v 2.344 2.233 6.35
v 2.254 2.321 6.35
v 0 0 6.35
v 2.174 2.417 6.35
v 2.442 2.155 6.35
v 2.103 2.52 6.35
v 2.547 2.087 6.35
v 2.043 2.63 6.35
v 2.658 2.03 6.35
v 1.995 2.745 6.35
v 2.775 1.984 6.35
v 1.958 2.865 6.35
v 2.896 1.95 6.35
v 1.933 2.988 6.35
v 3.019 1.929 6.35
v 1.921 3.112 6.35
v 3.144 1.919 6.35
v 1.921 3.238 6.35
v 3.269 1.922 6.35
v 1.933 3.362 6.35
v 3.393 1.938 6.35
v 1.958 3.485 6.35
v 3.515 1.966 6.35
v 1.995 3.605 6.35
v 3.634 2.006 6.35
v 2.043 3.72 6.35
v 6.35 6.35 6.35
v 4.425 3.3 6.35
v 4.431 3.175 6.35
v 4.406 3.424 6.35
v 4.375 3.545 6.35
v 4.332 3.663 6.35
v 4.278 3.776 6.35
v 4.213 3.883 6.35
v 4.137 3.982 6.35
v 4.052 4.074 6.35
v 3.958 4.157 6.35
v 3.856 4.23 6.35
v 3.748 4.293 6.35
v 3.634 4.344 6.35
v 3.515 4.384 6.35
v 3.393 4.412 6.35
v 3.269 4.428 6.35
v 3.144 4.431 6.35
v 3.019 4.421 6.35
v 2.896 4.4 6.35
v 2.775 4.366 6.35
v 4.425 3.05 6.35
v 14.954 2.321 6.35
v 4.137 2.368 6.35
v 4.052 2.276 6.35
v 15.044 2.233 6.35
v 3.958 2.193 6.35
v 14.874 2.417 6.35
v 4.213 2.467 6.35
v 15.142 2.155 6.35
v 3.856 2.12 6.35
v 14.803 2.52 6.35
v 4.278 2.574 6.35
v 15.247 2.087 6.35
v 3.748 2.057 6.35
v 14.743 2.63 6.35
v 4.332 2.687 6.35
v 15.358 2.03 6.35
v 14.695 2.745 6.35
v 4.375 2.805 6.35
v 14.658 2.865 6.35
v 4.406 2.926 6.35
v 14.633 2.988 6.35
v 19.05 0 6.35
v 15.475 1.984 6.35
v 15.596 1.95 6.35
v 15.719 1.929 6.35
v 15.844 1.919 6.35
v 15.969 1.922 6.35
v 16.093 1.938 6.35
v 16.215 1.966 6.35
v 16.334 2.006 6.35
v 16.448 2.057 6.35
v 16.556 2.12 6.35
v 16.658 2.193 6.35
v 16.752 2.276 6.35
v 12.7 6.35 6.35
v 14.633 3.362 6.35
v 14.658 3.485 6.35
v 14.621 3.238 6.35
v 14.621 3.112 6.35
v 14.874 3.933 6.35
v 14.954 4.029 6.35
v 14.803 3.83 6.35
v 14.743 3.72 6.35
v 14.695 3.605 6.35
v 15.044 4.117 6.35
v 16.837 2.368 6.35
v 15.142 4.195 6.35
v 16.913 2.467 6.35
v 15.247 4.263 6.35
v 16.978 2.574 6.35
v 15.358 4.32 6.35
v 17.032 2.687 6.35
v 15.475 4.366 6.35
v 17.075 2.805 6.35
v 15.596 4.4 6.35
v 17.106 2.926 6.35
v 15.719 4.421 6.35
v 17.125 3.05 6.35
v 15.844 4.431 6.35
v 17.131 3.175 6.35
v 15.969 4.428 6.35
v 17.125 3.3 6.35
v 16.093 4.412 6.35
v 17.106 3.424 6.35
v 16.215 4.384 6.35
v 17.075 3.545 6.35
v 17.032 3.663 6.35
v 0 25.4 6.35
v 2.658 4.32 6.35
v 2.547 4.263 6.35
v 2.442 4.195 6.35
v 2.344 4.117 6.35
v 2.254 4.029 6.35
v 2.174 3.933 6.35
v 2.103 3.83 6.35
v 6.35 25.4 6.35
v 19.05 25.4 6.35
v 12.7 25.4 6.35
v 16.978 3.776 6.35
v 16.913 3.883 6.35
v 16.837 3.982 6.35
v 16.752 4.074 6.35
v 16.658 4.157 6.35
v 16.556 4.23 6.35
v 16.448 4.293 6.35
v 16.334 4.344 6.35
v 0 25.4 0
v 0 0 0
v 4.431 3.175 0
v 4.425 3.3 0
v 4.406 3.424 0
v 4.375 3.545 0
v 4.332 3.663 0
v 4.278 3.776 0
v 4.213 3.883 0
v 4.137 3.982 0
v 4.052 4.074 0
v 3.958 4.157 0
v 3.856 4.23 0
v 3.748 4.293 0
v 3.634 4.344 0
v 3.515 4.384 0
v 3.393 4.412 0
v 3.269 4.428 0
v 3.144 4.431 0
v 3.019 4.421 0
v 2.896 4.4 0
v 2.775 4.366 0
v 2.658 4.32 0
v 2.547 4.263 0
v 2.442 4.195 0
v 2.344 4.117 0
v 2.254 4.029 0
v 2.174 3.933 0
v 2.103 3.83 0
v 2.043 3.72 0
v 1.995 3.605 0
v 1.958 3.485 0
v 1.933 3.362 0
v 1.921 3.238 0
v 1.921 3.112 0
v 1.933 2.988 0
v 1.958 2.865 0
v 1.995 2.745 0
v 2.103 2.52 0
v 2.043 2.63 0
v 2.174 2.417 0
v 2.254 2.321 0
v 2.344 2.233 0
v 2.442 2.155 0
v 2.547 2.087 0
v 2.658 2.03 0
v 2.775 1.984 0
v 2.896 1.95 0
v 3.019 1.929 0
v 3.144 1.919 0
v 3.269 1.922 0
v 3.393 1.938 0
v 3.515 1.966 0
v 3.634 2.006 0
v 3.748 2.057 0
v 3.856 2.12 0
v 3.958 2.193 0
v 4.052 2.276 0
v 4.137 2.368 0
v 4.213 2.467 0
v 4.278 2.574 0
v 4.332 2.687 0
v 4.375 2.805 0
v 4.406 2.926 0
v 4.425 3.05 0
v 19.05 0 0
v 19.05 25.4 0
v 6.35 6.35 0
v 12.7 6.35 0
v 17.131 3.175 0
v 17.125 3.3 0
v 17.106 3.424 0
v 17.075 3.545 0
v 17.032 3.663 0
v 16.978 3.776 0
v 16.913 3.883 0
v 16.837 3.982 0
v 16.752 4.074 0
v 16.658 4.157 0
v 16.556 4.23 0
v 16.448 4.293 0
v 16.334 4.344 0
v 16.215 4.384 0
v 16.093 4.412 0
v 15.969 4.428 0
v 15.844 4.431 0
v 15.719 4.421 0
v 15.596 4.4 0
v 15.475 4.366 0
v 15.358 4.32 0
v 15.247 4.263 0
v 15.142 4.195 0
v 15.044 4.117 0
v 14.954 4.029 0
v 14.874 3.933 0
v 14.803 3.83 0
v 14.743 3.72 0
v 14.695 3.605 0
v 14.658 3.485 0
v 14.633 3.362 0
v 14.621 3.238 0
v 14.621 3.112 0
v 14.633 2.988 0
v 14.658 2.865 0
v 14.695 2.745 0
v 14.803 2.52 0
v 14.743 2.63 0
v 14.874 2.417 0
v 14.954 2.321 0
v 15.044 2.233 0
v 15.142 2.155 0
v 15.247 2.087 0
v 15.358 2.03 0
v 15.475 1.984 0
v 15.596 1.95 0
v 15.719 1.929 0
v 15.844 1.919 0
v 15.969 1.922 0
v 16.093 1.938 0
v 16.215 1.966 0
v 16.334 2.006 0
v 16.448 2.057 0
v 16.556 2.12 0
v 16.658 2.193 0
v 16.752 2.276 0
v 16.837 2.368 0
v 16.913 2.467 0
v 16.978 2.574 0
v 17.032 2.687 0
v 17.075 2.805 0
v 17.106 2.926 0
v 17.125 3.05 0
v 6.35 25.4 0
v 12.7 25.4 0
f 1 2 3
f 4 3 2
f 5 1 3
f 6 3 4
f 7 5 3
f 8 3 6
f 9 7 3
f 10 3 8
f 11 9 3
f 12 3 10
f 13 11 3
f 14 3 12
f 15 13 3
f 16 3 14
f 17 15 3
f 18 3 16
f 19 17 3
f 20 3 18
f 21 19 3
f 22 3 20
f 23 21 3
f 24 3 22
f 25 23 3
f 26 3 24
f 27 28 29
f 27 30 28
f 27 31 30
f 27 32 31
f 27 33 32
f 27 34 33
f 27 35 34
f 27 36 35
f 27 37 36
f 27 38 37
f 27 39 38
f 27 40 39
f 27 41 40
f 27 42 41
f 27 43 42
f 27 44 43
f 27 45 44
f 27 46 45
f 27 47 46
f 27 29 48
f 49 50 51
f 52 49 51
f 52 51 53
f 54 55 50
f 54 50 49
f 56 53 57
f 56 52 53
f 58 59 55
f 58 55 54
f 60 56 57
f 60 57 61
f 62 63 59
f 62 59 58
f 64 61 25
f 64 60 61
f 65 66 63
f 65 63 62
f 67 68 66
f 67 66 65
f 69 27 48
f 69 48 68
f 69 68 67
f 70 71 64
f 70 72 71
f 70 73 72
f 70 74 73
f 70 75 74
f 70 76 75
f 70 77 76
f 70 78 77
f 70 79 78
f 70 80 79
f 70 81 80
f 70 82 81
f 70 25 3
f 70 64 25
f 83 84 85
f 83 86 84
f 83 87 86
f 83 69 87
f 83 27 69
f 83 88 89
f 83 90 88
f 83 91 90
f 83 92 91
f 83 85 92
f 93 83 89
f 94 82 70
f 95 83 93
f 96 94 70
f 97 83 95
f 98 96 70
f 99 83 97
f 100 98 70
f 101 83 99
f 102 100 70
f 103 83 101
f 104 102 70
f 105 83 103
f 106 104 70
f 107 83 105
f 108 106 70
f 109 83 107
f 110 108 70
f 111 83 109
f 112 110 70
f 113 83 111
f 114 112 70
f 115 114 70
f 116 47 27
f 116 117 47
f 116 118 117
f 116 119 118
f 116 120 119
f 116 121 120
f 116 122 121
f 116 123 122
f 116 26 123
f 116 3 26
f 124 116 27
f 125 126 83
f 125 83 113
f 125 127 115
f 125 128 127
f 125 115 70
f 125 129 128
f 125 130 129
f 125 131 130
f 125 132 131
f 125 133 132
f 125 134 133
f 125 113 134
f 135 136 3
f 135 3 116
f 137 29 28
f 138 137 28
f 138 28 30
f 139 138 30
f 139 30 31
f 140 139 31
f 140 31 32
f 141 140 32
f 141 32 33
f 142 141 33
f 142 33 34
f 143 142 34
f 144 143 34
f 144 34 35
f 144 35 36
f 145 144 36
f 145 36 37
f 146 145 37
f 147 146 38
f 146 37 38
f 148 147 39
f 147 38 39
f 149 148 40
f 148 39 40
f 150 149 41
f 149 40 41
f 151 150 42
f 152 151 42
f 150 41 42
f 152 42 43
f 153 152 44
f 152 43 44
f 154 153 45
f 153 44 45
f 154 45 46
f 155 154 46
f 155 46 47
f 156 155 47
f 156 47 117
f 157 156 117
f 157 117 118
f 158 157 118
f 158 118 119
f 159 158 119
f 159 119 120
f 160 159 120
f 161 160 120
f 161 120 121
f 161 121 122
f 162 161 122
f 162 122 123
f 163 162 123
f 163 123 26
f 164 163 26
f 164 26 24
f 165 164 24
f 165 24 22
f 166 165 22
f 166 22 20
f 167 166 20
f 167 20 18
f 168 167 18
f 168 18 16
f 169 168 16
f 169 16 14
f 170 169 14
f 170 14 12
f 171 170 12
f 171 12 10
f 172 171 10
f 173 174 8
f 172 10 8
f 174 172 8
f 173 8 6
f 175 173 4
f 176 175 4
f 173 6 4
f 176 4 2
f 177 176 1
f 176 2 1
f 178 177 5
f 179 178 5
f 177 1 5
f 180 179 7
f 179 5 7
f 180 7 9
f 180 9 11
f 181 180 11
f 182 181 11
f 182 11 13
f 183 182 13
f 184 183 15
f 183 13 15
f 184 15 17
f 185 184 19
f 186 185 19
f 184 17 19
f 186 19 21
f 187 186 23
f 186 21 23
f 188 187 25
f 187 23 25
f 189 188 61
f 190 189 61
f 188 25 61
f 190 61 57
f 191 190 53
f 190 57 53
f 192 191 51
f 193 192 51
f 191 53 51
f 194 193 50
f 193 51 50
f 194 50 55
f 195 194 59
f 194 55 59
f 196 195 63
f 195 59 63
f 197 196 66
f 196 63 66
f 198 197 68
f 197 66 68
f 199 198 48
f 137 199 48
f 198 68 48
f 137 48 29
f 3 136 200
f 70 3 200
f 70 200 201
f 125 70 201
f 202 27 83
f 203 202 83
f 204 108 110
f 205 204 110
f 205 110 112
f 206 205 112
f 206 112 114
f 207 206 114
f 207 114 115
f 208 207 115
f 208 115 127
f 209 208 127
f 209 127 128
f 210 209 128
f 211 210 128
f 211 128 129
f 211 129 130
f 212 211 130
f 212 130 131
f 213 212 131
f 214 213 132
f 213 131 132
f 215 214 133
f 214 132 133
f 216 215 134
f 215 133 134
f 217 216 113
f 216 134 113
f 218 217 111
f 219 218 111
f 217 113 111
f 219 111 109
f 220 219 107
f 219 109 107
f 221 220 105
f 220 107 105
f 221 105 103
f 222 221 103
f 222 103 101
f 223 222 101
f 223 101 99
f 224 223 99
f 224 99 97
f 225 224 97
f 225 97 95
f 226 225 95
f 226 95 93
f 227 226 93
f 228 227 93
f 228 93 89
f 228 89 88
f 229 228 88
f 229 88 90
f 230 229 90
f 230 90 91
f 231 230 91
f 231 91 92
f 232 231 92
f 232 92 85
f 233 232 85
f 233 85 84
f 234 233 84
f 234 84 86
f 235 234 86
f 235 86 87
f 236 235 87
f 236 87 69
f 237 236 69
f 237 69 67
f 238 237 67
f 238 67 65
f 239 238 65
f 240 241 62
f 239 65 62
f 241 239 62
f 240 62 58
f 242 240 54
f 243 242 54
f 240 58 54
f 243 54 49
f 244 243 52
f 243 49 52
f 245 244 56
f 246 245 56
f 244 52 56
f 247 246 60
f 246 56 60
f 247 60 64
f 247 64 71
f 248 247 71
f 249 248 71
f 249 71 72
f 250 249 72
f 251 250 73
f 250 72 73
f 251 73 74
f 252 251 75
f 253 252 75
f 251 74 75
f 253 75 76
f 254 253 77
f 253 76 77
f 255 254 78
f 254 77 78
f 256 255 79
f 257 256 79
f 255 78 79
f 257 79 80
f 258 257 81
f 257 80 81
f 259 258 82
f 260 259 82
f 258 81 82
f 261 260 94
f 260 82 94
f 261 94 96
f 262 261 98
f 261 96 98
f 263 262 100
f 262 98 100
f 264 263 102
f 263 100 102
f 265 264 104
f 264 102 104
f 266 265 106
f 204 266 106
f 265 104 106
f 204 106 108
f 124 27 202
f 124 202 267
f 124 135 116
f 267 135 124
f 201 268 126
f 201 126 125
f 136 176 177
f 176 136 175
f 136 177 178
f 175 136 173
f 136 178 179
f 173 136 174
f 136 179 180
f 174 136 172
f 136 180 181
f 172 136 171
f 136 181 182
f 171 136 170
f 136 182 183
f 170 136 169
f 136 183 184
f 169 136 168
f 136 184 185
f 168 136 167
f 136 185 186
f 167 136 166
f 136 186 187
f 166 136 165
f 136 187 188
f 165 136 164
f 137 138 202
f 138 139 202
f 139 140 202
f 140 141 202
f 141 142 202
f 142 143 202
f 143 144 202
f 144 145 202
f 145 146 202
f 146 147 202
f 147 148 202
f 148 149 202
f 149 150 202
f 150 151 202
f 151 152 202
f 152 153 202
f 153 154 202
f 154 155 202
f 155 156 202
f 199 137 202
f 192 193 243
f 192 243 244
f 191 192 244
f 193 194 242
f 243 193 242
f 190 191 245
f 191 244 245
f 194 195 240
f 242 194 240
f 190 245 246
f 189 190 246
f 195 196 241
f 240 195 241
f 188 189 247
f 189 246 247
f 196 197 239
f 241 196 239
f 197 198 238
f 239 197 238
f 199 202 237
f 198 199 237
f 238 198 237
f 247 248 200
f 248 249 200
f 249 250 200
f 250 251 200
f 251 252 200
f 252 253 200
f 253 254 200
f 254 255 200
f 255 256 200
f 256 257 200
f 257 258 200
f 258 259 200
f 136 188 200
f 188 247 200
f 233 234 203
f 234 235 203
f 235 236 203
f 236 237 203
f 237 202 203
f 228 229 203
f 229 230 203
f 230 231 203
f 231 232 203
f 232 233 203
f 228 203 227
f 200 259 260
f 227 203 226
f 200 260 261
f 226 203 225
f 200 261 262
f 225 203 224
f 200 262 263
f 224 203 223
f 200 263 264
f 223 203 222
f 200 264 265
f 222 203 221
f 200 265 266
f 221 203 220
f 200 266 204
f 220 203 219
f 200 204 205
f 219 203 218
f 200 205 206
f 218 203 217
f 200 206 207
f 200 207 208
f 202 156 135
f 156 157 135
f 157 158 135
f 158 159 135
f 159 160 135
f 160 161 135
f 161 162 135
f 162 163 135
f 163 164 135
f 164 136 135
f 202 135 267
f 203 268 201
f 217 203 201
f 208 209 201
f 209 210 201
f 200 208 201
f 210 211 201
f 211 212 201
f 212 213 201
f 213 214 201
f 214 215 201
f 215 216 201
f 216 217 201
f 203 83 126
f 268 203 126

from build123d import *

# Parameters (mm, degrees)
SKETCH1_W        = 19.05
SKETCH1_H        = 25.4
MAIN_BLOCK_DEPTH = 6.35
SKETCH2_W        = 6.35
SKETCH2_H        = 19.05
U_CUT_DEPTH      = 12.7
SKETCH3_R        = 1.25603
BOLT_HOLES_DEPTH = 12.7


with BuildPart() as part:
    # Sketch1 → Main block (new body)
    with BuildSketch(Plane.XY):
        with Locations((9.525, 12.7)):
            Rectangle(SKETCH1_W, SKETCH1_H)
    extrude(amount=MAIN_BLOCK_DEPTH)

    # Sketch2 → U-cut (cut)
    with BuildSketch(Plane.XY.offset(6.35)):
        with Locations((9.525, 15.875)):
            Rectangle(SKETCH2_W, SKETCH2_H)
    extrude(amount=-U_CUT_DEPTH, mode=Mode.SUBTRACT)

    # Sketch3 → Bolt holes (cut)
    with BuildSketch(Plane.XY.offset(6.35)):
        with Locations((3.175, 3.175)):
            Circle(SKETCH3_R)
        with Locations((15.875, 3.175)):
            Circle(SKETCH3_R)
    extrude(amount=-BOLT_HOLES_DEPTH, mode=Mode.SUBTRACT)


solid = part.part
